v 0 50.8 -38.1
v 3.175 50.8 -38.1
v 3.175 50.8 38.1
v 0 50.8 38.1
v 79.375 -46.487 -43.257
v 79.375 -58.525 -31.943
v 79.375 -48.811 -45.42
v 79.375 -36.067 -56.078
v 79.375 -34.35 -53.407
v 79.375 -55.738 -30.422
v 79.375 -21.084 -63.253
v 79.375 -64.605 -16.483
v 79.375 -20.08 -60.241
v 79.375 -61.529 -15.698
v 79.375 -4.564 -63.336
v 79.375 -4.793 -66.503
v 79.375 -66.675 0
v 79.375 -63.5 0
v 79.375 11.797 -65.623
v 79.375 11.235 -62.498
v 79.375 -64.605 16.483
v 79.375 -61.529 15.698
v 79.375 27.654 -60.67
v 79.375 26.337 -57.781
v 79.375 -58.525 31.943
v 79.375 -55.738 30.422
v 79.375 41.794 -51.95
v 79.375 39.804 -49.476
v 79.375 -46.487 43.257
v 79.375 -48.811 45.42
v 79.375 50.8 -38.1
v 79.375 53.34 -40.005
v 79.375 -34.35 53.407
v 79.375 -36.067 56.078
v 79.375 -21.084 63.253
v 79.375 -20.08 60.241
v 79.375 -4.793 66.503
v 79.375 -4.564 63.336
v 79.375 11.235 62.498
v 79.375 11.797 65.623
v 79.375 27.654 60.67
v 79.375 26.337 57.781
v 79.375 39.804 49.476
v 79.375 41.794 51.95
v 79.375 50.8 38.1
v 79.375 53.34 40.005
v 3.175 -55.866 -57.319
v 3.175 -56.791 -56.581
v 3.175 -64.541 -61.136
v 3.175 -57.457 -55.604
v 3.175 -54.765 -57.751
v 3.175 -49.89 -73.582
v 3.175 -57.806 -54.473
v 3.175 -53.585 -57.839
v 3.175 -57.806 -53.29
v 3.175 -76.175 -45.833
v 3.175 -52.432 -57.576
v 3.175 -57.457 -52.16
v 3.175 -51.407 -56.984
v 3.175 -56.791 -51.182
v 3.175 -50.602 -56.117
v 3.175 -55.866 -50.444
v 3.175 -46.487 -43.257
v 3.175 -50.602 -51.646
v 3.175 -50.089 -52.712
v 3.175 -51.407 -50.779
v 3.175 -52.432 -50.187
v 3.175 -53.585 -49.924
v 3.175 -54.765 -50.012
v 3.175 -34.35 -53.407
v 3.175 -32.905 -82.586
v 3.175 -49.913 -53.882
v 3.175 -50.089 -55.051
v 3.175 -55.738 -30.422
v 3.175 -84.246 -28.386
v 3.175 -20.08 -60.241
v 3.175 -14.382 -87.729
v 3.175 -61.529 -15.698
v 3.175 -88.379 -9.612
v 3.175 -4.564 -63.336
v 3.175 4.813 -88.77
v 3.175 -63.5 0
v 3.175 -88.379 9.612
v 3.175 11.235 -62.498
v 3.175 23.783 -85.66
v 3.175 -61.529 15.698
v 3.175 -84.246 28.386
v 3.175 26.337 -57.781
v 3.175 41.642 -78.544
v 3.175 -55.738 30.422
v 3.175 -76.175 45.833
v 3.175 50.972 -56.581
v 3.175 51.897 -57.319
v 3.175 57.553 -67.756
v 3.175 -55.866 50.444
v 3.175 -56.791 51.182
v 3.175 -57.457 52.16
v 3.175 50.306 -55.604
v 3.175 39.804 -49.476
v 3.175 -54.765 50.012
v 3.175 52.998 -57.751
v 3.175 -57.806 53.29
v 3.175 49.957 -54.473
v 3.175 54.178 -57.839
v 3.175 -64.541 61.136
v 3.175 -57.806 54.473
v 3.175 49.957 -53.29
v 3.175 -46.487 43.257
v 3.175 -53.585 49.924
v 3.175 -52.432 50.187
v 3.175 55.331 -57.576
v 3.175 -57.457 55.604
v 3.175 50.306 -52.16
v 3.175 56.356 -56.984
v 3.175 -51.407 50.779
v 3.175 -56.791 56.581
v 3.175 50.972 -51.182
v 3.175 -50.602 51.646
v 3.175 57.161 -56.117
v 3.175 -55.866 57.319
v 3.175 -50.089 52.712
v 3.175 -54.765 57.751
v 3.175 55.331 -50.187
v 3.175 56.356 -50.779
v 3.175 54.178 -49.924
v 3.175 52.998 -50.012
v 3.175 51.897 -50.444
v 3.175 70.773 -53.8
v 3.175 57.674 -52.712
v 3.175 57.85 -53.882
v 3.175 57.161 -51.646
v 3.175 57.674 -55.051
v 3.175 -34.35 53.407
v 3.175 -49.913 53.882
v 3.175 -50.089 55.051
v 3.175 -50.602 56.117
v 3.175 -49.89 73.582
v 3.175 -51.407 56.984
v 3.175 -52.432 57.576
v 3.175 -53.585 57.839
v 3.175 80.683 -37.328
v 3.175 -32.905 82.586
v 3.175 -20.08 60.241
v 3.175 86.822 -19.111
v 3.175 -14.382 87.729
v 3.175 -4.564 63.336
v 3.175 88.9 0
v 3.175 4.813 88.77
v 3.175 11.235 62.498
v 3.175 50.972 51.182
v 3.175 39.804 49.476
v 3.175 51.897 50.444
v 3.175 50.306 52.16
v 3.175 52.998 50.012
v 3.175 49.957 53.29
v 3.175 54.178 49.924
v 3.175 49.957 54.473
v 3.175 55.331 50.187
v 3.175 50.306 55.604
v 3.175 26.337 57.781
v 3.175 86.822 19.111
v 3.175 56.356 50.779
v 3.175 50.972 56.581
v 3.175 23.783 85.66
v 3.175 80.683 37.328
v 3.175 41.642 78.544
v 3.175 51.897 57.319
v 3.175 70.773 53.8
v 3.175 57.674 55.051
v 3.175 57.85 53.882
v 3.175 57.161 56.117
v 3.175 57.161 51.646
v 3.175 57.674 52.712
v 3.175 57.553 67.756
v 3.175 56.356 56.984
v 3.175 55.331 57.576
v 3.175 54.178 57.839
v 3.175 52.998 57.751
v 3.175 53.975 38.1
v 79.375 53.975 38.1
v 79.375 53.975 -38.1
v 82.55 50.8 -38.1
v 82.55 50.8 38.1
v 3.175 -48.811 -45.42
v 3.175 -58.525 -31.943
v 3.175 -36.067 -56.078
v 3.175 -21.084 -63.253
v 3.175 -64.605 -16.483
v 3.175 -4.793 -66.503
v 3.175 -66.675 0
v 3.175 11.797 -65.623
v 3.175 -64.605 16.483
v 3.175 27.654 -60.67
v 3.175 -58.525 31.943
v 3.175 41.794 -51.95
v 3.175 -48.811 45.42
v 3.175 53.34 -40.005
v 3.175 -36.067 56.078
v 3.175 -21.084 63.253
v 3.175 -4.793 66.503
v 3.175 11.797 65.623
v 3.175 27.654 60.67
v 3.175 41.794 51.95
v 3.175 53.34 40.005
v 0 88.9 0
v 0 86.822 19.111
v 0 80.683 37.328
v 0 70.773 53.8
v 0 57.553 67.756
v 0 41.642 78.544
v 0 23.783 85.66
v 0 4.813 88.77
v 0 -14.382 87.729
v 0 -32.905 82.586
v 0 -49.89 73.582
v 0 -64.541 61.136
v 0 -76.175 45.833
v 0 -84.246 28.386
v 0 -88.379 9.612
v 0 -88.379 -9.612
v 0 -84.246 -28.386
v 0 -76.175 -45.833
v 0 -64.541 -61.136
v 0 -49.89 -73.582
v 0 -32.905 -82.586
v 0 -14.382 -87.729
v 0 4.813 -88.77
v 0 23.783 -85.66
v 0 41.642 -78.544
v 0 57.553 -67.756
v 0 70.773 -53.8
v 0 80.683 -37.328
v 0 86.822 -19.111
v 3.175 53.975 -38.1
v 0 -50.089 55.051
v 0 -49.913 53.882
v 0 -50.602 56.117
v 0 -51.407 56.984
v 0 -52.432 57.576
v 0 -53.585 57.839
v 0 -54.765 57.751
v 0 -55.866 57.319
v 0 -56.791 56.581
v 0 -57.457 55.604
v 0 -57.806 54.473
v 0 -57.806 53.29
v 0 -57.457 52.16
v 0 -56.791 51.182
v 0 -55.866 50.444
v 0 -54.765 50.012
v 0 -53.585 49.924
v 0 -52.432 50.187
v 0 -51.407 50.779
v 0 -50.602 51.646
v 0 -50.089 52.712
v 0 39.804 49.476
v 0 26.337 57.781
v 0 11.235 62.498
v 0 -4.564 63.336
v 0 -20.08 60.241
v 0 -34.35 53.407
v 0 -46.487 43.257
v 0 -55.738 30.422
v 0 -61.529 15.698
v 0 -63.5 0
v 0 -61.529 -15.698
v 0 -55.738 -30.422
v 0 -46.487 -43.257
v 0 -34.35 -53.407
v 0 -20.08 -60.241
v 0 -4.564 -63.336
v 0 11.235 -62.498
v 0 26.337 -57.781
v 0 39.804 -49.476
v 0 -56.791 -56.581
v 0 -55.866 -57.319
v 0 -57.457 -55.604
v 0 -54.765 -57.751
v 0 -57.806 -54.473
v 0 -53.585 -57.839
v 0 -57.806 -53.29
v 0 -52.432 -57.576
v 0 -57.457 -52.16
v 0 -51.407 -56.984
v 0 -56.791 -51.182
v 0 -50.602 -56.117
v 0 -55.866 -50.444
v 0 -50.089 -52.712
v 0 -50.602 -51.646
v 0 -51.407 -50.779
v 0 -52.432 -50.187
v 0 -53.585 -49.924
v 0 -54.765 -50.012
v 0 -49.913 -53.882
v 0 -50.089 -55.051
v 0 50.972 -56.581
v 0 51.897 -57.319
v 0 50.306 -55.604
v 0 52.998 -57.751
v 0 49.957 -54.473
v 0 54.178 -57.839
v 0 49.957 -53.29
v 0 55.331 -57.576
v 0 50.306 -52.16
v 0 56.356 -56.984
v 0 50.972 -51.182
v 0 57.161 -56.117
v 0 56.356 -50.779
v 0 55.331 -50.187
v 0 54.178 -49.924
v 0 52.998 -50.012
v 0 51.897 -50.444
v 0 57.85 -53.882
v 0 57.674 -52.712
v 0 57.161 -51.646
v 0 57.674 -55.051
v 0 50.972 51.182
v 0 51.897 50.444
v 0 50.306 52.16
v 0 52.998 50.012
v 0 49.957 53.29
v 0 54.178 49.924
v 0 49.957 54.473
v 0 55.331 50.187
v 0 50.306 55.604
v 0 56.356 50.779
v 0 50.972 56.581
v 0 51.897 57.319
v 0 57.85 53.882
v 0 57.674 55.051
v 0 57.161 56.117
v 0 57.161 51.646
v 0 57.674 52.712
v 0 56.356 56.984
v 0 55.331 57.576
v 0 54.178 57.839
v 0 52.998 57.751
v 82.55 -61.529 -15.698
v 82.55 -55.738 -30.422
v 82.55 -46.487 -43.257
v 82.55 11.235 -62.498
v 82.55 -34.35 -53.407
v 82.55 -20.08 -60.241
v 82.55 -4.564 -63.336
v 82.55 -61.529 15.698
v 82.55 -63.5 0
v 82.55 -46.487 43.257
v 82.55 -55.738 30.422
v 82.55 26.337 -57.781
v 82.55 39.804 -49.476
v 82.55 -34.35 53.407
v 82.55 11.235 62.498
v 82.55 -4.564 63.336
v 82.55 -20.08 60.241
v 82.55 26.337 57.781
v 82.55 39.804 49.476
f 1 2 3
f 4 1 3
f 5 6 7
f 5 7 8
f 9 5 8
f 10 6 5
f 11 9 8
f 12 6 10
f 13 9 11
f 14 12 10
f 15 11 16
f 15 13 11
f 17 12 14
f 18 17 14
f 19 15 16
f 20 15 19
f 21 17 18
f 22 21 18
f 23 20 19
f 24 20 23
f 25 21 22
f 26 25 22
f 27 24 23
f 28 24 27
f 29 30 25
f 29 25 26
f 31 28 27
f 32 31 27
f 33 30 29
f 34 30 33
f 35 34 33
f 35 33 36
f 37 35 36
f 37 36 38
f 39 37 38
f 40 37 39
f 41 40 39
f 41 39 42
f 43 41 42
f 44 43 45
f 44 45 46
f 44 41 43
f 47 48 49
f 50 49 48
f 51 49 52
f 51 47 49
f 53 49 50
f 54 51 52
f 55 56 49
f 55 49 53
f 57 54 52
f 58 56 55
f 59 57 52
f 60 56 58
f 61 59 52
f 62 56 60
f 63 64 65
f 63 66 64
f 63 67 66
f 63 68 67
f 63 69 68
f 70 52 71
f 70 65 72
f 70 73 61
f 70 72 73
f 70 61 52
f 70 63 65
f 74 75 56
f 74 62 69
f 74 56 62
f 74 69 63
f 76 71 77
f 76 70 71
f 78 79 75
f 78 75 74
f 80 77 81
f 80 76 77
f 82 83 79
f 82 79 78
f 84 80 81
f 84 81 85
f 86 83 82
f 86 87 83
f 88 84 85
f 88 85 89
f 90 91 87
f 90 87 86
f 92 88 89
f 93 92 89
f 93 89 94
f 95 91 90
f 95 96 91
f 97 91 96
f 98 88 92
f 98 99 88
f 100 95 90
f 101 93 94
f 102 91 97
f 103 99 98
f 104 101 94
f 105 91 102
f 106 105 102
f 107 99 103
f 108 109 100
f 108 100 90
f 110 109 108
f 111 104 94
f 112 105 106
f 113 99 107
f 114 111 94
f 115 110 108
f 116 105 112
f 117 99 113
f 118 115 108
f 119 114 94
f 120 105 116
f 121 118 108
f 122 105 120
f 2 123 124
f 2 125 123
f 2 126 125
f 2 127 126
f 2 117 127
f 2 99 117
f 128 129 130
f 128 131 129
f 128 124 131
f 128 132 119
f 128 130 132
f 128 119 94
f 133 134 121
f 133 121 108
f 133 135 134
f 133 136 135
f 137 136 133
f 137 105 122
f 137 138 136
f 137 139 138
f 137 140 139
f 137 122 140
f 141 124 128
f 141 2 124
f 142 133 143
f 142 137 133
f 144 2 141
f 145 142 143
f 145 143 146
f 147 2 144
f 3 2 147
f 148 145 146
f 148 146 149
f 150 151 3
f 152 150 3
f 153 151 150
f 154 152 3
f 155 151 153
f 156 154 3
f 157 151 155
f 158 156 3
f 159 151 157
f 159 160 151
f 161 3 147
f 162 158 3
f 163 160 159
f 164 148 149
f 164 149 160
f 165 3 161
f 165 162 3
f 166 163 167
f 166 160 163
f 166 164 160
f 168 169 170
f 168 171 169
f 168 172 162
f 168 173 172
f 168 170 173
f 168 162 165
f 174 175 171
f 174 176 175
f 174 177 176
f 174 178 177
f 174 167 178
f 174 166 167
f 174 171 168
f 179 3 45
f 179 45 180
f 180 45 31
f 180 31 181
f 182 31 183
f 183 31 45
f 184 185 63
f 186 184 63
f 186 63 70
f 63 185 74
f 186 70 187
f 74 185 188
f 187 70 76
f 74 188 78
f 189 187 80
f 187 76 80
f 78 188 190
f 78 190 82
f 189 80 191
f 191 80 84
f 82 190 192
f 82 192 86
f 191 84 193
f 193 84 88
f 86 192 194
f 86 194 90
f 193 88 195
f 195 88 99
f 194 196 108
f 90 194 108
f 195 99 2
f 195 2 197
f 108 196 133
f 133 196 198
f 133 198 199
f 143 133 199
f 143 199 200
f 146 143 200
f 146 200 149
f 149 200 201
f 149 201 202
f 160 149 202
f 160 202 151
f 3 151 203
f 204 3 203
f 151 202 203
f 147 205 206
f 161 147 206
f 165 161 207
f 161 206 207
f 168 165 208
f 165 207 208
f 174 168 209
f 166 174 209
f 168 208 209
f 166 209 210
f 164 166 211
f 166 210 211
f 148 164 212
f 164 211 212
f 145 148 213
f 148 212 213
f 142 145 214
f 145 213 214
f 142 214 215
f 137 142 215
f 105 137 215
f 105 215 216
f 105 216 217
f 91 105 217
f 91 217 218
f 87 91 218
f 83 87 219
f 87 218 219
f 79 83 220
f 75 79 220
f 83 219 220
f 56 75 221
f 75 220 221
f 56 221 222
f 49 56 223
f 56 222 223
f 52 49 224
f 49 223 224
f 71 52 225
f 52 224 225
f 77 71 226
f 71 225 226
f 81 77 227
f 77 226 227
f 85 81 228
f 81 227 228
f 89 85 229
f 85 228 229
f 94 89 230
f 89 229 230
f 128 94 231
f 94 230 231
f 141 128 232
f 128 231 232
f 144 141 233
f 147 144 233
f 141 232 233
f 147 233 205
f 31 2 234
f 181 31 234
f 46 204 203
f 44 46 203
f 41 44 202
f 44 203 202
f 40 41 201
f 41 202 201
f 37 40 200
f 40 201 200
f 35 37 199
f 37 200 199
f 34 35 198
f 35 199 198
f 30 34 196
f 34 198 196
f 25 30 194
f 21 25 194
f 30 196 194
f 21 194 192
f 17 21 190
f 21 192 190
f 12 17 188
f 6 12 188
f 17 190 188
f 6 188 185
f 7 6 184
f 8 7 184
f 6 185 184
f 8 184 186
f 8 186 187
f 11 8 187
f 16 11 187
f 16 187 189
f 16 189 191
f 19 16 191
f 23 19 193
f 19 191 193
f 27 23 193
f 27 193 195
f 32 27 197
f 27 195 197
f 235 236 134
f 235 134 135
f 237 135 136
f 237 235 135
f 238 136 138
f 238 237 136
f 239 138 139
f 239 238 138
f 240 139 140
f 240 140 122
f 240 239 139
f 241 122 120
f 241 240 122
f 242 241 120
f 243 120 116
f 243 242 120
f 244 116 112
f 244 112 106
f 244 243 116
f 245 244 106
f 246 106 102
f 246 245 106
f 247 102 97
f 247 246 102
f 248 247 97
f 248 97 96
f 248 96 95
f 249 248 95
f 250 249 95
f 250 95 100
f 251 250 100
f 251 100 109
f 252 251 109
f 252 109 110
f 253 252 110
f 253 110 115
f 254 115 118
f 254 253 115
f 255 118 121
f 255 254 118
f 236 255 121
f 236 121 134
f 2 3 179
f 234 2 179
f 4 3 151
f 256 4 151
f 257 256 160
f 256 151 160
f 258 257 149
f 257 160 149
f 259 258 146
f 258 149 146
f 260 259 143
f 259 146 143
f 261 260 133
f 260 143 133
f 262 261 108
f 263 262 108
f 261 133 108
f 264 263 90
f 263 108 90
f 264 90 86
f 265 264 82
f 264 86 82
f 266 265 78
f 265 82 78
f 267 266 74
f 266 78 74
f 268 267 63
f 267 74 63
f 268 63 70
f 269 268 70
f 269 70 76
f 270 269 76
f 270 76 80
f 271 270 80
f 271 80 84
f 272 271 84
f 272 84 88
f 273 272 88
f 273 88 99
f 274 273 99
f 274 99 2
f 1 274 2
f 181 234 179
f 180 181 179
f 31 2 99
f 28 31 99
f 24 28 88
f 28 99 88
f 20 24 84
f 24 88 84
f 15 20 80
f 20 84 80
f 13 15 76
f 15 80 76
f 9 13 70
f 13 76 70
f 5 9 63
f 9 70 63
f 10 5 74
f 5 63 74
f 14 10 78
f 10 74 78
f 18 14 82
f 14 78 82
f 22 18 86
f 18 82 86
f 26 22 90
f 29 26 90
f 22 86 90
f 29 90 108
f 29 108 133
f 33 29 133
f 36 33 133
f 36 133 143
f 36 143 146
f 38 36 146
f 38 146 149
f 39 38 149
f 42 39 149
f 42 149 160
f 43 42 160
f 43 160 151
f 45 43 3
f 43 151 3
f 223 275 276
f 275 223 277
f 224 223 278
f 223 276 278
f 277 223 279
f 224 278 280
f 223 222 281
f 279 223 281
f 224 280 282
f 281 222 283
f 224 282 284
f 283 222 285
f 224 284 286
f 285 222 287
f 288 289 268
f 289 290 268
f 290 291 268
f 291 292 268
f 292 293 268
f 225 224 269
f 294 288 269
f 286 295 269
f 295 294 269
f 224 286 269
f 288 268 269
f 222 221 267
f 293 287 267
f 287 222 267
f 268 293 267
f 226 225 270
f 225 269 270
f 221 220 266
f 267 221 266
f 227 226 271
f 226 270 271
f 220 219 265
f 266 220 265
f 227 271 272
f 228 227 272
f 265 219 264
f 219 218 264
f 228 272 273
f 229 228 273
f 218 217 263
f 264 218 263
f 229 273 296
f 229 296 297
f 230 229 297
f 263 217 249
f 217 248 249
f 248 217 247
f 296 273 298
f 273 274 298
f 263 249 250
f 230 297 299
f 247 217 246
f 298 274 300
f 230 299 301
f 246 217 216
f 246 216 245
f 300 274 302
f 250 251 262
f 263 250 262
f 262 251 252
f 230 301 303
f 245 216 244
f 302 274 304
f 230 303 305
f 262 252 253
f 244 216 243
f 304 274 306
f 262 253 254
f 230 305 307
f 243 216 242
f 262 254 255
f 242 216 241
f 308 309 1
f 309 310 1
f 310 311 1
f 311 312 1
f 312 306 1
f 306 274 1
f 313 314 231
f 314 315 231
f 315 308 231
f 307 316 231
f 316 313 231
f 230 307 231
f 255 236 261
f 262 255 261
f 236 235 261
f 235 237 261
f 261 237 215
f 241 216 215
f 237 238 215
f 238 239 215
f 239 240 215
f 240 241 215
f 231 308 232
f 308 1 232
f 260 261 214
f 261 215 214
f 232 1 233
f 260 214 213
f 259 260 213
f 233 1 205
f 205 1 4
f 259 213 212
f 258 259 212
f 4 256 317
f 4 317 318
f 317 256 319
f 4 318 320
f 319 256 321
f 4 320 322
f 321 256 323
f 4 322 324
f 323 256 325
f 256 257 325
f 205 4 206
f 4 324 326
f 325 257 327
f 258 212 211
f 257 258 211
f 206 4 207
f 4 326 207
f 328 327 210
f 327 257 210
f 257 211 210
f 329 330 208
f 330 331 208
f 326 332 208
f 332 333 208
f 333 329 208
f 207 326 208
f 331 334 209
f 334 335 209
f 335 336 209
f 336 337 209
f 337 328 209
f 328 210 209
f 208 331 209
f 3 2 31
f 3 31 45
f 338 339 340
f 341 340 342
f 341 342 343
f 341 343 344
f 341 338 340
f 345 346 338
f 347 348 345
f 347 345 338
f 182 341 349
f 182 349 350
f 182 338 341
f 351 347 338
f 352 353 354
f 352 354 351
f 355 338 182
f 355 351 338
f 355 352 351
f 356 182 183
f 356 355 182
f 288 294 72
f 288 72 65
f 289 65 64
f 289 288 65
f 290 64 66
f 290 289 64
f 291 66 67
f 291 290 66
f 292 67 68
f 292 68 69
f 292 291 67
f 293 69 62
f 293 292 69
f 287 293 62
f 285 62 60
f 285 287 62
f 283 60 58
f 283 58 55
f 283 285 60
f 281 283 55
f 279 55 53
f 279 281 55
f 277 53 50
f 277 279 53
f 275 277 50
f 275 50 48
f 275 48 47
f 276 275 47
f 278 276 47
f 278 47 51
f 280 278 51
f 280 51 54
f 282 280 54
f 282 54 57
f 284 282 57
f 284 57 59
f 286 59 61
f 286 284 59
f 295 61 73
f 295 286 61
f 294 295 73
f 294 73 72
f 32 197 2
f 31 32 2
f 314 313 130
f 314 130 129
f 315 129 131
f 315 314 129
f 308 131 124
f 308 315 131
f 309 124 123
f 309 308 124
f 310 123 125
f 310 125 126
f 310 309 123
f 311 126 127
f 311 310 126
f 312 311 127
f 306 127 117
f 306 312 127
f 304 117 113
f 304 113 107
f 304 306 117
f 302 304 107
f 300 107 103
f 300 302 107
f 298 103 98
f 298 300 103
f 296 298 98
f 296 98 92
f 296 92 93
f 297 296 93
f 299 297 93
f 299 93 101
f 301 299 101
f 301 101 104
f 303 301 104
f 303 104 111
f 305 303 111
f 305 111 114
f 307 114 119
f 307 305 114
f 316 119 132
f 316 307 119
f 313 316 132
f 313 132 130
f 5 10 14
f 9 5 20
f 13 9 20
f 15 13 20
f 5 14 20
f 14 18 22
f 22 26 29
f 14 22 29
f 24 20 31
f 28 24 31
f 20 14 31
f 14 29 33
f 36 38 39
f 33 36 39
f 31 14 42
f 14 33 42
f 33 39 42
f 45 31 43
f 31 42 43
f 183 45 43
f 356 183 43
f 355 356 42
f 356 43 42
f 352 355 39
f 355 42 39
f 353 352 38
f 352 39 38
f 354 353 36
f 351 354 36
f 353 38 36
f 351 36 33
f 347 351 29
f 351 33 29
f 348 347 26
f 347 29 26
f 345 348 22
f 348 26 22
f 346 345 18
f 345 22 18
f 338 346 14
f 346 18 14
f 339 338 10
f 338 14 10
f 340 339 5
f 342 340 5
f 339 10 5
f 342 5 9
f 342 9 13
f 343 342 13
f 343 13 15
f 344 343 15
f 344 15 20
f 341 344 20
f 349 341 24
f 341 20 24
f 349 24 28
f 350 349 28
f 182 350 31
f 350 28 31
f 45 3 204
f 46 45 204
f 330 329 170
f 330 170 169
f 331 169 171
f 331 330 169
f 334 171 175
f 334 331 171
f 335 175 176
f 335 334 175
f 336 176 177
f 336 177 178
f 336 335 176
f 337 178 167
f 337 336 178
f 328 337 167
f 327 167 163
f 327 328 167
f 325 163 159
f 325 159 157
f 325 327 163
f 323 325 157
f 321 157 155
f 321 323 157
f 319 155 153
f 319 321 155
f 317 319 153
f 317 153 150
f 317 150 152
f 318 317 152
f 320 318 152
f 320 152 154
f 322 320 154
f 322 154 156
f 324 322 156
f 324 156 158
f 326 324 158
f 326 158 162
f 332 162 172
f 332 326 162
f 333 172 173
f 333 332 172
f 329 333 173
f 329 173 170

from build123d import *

# Parameters (mm, degrees)
F0_R     = 88.9
F0_R_2   = 3.96875
F1_DEPTH = 3.175
F3_DEPTH = 3.176
F5_DEPTH = 76.2
F6_W     = 3.175
F6_H     = 76.2
F7_DEPTH = 76.2
F9_DEPTH = 3.175


with BuildPart() as f1:
    # F0 (on Right) → F1 (new body)
    with BuildSketch(Plane.YZ):
        Circle(F0_R)
        with Locations((-53.881537, -53.881537)):
            Circle(F0_R_2, mode=Mode.SUBTRACT)
        with Locations((53.881537, -53.881537)):
            Circle(F0_R_2, mode=Mode.SUBTRACT)
        with Locations((-53.881537, 53.881537)):
            Circle(F0_R_2, mode=Mode.SUBTRACT)
        with Locations((53.881537, 53.881537)):
            Circle(F0_R_2, mode=Mode.SUBTRACT)
    extrude(amount=F1_DEPTH)

    # F2 (on face) → F3 (cut, through all)
    with BuildSketch(Plane.YZ.offset(3.175)):
        with BuildLine():
            Line((50.8, -38.1), (50.8, 38.1))
            ThreePointArc((50.8, 38.1), (-63.5, 0), (50.8, -38.1))
        make_face()
    extrude(amount=-F3_DEPTH, mode=Mode.SUBTRACT)


with BuildPart() as f5:
    # F4 (on face) → F5 (new body)
    with BuildSketch(Plane.YZ.offset(3.175)):
        with BuildLine():
            ThreePointArc((50.8, -38.1), (-63.5, 0), (50.8, 38.1))
            Line((50.8, 38.1), (53.34, 40.005))
            ThreePointArc((53.34, 40.005), (-66.675, 0), (53.34, -40.005))
            Line((53.34, -40.005), (50.8, -38.1))
        make_face()
    extrude(amount=F5_DEPTH)


with BuildPart() as f7:
    # F6 (on face) → F7 (new body)
    with BuildSketch(Plane.YZ.offset(3.175)):
        with Locations((52.3875, 0)):
            Rectangle(F6_W, F6_H)
    extrude(amount=F7_DEPTH)


with BuildPart() as f9:
    # F8 (on face) → F9 (new body)
    with BuildSketch(Plane.YZ.offset(79.375)):
        with BuildLine():
            Line((50.8, -38.1), (50.8, 38.1))
            ThreePointArc((50.8, 38.1), (-63.5, 0), (50.8, -38.1))
        make_face()
    extrude(amount=F9_DEPTH)


solid = Compound([f1.part, f5.part, f7.part, f9.part])
